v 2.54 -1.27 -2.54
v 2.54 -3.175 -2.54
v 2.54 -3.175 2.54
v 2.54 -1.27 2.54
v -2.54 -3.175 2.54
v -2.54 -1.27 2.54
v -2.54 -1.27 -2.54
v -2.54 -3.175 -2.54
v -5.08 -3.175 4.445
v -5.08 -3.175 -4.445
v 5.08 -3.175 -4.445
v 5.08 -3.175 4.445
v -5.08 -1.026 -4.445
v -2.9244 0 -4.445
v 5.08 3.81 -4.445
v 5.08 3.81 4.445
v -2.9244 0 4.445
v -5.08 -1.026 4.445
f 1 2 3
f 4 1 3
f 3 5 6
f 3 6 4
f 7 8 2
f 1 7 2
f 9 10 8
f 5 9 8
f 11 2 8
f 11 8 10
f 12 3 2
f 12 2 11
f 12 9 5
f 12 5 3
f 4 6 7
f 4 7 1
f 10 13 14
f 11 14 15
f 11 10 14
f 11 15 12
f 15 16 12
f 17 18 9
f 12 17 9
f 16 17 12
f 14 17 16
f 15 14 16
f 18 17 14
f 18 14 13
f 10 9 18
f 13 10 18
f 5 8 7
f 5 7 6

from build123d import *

# Parameters (mm, degrees)
SKETCH1_W                       = 10.16
SKETCH1_H                       = 3.175
BOSS_EXTRUDE1_DEPTH             = 4.445
SKETCH3_OUTSIDE_W               = 14.934
SKETCH3_OUTSIDE_H               = 13.664
SKETCH3_OUTSIDE_W_2             = 10.16
SKETCH3_OUTSIDE_H_2             = 8.89
SKETCH3_OUTSIDE_W_3             = 5.08
SKETCH3_OUTSIDE_H_3             = 5.08
CUT_EXTRUDE1_DEPTH              = 1.905
BOSS_EXTRUDE2_REACH             = 6.445
BOSS_EXTRUDE2_DIRECTION_2_REACH = 6.445
CUT_EXTRUDE3_DEPTH              = 5.445
CUT_EXTRUDE3_DEPTH_BACK         = 5.445


with BuildPart() as part:
    # Sketch1 → Boss-Extrude1 (new body, symmetric)
    with BuildSketch(Plane.XY):
        with Locations((0, -1.5875)):
            Rectangle(SKETCH1_W, SKETCH1_H)
    extrude(amount=BOSS_EXTRUDE1_DEPTH, both=True)

    # Sketch3 outside → Cut-Extrude1 (cut)
    with BuildSketch(Plane.XZ.offset(3.175)):
        Rectangle(SKETCH3_OUTSIDE_W, SKETCH3_OUTSIDE_H)
        Rectangle(SKETCH3_OUTSIDE_W_2, SKETCH3_OUTSIDE_H_2, mode=Mode.SUBTRACT)
        Rectangle(SKETCH3_OUTSIDE_W_3, SKETCH3_OUTSIDE_H_3)
    extrude(amount=-CUT_EXTRUDE1_DEPTH, mode=Mode.SUBTRACT)

    # Boss-Extrude2: up to this face of the body (flat: up to its plane)
    boss_extrude2_end = Plane(part.part.faces().sort_by_distance((0, -1.5875, 4.445))[0])
    # Sketch5 → Boss-Extrude2 (add, up to the picked face)
    with BuildSketch(Plane.XY, mode=Mode.PRIVATE) as boss_extrude2_sk1:
        Polygon((-2.924444558, 0), (5.08, 3.81), (5.08, 0), align=None)
    boss_extrude2_tool1 = split(extrude(boss_extrude2_sk1.sketch, amount=BOSS_EXTRUDE2_REACH, mode=Mode.PRIVATE), bisect_by=boss_extrude2_end, keep=Keep.BOTH, mode=Mode.PRIVATE)
    add(boss_extrude2_tool1.solids().sort_by_distance((2.411852, 1.27, 0))[0])

    # Boss-Extrude2 direction 2: up to this face of the body (flat: up to its plane)
    boss_extrude2_direction_2_end = Plane(part.part.faces().sort_by_distance((0, -1.5875, -4.445))[0])
    # Sketch5 → Boss-Extrude2 direction 2 (add, up to the picked face)
    with BuildSketch(Plane.XY, mode=Mode.PRIVATE) as boss_extrude2_direction_2_sk1:
        Polygon((-2.924444558, 0), (5.08, 3.81), (5.08, 0), align=None)
    boss_extrude2_direction_2_tool1 = split(extrude(boss_extrude2_direction_2_sk1.sketch, amount=-BOSS_EXTRUDE2_DIRECTION_2_REACH, mode=Mode.PRIVATE), bisect_by=boss_extrude2_direction_2_end, keep=Keep.BOTH, mode=Mode.PRIVATE)
    add(boss_extrude2_direction_2_tool1.solids().sort_by_distance((2.411852, 1.27, 0))[0])

    # Sketch6 → Cut-Extrude3 (cut, two sides)
    with BuildSketch(Plane.XY) as cut_extrude3_sk:
        Polygon((-5.08, -1.026013257), (-5.08, 0), (-2.924444558, 0), align=None)
    extrude(amount=CUT_EXTRUDE3_DEPTH, mode=Mode.SUBTRACT)
    extrude(cut_extrude3_sk.sketch, amount=-CUT_EXTRUDE3_DEPTH_BACK, mode=Mode.SUBTRACT)


solid = part.part
